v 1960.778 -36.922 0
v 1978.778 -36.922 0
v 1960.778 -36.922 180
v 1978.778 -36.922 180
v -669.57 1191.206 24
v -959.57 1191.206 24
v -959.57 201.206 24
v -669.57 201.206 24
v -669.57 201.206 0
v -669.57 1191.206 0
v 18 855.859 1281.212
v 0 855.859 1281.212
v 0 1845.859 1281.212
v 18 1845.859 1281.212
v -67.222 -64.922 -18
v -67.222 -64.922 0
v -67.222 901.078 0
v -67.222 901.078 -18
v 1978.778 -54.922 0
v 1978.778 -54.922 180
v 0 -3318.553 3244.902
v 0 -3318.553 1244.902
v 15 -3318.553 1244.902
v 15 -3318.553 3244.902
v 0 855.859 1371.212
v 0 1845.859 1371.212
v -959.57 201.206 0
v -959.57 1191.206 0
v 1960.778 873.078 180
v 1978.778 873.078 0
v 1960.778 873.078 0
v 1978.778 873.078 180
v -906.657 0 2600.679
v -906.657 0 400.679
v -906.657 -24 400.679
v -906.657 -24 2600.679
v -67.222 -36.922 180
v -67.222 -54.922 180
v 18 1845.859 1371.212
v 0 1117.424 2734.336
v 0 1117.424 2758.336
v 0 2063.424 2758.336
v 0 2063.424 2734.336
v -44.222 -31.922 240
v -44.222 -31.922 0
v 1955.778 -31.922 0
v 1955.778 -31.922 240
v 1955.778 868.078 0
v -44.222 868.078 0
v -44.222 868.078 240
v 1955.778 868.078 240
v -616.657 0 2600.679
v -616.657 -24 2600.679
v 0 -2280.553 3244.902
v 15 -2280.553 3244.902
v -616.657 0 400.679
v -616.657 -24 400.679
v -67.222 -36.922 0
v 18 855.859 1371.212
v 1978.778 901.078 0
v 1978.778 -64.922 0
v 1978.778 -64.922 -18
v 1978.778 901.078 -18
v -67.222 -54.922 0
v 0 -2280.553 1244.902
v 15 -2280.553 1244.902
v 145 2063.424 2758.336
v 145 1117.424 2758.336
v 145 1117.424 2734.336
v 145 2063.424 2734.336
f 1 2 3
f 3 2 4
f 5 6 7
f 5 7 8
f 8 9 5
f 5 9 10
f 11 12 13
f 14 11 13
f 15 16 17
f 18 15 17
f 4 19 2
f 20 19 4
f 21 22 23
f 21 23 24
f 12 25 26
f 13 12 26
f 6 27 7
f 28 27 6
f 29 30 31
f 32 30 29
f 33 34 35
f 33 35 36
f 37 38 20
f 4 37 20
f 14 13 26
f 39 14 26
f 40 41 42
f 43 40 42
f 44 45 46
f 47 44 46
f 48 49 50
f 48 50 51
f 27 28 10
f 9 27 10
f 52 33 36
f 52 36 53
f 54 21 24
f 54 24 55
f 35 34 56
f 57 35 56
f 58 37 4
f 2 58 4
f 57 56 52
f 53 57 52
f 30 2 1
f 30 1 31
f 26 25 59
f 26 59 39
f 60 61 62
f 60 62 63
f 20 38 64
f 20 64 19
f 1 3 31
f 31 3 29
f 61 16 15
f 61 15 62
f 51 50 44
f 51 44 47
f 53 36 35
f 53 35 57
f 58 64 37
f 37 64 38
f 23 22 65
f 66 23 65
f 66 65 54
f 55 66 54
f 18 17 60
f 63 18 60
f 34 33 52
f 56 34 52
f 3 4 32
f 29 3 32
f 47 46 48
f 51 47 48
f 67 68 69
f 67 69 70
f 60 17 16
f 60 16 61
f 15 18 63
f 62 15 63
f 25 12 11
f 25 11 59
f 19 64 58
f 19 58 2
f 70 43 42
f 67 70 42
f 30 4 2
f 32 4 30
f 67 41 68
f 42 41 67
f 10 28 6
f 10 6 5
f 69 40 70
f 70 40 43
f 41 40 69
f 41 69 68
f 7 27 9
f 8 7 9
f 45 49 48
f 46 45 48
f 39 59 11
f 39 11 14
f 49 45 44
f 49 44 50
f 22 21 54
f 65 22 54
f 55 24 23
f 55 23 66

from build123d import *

# Parameters (mm, degrees)
F5_W      = 2000
F5_H      = 900
F6_DEPTH  = 240
F7_W      = 2046
F7_H      = 966
F8_DEPTH  = 18
F10_W     = 2046
F10_H     = 180
F11_DEPTH = 18
F12_W     = 910
F12_H     = 180
F13_DEPTH = 18
F14_W     = 290
F14_H     = 2200
F15_DEPTH = 24
F16_W     = 290
F16_H     = 990
F17_DEPTH = 24
F18_W     = 990
F18_H     = 90
F19_DEPTH = 18
F20_W     = 946
F20_H     = 24
F21_DEPTH = 145
F22_W     = 1038
F22_H     = 2000
F23_DEPTH = 15


with BuildPart() as f6:
    # F5 (on Top) → F6 (new body)
    with BuildSketch(Plane.XY):
        with Locations((955.7780921459, 418.0782295763)):
            Rectangle(F5_W, F5_H)
    extrude(amount=F6_DEPTH)


with BuildPart() as f8:
    # F7 (on Top) → F8 (new body)
    with BuildSketch(Plane.XY):
        with Locations((955.7780921459, 418.0782295763)):
            Rectangle(F7_W, F7_H)
    extrude(amount=-F8_DEPTH)


with BuildPart() as f11:
    # F10 (on offset) → F11 (new body)
    with BuildSketch(Plane.XZ.offset(54.9217704237)):
        with Locations((955.7780921459, 90)):
            Rectangle(F10_W, F10_H)
    extrude(amount=-F11_DEPTH)


with BuildPart() as f13:
    # F12 (on face) → F13 (new body)
    with BuildSketch(Plane.YZ.offset(1978.7780921459)):
        with Locations((418.0782295763, 90)):
            Rectangle(F12_W, F12_H)
    extrude(amount=-F13_DEPTH)


with BuildPart() as f15:
    # F14 (on Front) → F15 (new body)
    with BuildSketch(Plane.XZ):
        with Locations((-761.657433033, 1500.679255718)):
            Rectangle(F14_W, F14_H)
    extrude(amount=F15_DEPTH)


with BuildPart() as f17:
    # F16 (on Top) → F17 (new body)
    with BuildSketch(Plane.XY):
        with Locations((-814.5700612068, 696.2062922447)):
            Rectangle(F16_W, F16_H)
    extrude(amount=F17_DEPTH)


with BuildPart() as f19:
    # F18 (on Right) → F19 (new body)
    with BuildSketch(Plane.YZ):
        with Locations((1350.8586287498, 1326.2122045411)):
            Rectangle(F18_W, F18_H)
    extrude(amount=F19_DEPTH)


with BuildPart() as f21:
    # F20 (on Right) → F21 (new body)
    with BuildSketch(Plane.YZ):
        with Locations((1590.4243588448, 2746.336264422)):
            Rectangle(F20_W, F20_H)
    extrude(amount=F21_DEPTH)


with BuildPart() as f23:
    # F22 (on Right) → F23 (new body)
    with BuildSketch(Plane.YZ):
        with Locations((-2799.5529594421, 2244.9015852496)):
            Rectangle(F22_W, F22_H)
    extrude(amount=F23_DEPTH)


solid = Compound([f6.part, f8.part, f11.part, f13.part, f15.part, f17.part, f19.part, f21.part, f23.part])
